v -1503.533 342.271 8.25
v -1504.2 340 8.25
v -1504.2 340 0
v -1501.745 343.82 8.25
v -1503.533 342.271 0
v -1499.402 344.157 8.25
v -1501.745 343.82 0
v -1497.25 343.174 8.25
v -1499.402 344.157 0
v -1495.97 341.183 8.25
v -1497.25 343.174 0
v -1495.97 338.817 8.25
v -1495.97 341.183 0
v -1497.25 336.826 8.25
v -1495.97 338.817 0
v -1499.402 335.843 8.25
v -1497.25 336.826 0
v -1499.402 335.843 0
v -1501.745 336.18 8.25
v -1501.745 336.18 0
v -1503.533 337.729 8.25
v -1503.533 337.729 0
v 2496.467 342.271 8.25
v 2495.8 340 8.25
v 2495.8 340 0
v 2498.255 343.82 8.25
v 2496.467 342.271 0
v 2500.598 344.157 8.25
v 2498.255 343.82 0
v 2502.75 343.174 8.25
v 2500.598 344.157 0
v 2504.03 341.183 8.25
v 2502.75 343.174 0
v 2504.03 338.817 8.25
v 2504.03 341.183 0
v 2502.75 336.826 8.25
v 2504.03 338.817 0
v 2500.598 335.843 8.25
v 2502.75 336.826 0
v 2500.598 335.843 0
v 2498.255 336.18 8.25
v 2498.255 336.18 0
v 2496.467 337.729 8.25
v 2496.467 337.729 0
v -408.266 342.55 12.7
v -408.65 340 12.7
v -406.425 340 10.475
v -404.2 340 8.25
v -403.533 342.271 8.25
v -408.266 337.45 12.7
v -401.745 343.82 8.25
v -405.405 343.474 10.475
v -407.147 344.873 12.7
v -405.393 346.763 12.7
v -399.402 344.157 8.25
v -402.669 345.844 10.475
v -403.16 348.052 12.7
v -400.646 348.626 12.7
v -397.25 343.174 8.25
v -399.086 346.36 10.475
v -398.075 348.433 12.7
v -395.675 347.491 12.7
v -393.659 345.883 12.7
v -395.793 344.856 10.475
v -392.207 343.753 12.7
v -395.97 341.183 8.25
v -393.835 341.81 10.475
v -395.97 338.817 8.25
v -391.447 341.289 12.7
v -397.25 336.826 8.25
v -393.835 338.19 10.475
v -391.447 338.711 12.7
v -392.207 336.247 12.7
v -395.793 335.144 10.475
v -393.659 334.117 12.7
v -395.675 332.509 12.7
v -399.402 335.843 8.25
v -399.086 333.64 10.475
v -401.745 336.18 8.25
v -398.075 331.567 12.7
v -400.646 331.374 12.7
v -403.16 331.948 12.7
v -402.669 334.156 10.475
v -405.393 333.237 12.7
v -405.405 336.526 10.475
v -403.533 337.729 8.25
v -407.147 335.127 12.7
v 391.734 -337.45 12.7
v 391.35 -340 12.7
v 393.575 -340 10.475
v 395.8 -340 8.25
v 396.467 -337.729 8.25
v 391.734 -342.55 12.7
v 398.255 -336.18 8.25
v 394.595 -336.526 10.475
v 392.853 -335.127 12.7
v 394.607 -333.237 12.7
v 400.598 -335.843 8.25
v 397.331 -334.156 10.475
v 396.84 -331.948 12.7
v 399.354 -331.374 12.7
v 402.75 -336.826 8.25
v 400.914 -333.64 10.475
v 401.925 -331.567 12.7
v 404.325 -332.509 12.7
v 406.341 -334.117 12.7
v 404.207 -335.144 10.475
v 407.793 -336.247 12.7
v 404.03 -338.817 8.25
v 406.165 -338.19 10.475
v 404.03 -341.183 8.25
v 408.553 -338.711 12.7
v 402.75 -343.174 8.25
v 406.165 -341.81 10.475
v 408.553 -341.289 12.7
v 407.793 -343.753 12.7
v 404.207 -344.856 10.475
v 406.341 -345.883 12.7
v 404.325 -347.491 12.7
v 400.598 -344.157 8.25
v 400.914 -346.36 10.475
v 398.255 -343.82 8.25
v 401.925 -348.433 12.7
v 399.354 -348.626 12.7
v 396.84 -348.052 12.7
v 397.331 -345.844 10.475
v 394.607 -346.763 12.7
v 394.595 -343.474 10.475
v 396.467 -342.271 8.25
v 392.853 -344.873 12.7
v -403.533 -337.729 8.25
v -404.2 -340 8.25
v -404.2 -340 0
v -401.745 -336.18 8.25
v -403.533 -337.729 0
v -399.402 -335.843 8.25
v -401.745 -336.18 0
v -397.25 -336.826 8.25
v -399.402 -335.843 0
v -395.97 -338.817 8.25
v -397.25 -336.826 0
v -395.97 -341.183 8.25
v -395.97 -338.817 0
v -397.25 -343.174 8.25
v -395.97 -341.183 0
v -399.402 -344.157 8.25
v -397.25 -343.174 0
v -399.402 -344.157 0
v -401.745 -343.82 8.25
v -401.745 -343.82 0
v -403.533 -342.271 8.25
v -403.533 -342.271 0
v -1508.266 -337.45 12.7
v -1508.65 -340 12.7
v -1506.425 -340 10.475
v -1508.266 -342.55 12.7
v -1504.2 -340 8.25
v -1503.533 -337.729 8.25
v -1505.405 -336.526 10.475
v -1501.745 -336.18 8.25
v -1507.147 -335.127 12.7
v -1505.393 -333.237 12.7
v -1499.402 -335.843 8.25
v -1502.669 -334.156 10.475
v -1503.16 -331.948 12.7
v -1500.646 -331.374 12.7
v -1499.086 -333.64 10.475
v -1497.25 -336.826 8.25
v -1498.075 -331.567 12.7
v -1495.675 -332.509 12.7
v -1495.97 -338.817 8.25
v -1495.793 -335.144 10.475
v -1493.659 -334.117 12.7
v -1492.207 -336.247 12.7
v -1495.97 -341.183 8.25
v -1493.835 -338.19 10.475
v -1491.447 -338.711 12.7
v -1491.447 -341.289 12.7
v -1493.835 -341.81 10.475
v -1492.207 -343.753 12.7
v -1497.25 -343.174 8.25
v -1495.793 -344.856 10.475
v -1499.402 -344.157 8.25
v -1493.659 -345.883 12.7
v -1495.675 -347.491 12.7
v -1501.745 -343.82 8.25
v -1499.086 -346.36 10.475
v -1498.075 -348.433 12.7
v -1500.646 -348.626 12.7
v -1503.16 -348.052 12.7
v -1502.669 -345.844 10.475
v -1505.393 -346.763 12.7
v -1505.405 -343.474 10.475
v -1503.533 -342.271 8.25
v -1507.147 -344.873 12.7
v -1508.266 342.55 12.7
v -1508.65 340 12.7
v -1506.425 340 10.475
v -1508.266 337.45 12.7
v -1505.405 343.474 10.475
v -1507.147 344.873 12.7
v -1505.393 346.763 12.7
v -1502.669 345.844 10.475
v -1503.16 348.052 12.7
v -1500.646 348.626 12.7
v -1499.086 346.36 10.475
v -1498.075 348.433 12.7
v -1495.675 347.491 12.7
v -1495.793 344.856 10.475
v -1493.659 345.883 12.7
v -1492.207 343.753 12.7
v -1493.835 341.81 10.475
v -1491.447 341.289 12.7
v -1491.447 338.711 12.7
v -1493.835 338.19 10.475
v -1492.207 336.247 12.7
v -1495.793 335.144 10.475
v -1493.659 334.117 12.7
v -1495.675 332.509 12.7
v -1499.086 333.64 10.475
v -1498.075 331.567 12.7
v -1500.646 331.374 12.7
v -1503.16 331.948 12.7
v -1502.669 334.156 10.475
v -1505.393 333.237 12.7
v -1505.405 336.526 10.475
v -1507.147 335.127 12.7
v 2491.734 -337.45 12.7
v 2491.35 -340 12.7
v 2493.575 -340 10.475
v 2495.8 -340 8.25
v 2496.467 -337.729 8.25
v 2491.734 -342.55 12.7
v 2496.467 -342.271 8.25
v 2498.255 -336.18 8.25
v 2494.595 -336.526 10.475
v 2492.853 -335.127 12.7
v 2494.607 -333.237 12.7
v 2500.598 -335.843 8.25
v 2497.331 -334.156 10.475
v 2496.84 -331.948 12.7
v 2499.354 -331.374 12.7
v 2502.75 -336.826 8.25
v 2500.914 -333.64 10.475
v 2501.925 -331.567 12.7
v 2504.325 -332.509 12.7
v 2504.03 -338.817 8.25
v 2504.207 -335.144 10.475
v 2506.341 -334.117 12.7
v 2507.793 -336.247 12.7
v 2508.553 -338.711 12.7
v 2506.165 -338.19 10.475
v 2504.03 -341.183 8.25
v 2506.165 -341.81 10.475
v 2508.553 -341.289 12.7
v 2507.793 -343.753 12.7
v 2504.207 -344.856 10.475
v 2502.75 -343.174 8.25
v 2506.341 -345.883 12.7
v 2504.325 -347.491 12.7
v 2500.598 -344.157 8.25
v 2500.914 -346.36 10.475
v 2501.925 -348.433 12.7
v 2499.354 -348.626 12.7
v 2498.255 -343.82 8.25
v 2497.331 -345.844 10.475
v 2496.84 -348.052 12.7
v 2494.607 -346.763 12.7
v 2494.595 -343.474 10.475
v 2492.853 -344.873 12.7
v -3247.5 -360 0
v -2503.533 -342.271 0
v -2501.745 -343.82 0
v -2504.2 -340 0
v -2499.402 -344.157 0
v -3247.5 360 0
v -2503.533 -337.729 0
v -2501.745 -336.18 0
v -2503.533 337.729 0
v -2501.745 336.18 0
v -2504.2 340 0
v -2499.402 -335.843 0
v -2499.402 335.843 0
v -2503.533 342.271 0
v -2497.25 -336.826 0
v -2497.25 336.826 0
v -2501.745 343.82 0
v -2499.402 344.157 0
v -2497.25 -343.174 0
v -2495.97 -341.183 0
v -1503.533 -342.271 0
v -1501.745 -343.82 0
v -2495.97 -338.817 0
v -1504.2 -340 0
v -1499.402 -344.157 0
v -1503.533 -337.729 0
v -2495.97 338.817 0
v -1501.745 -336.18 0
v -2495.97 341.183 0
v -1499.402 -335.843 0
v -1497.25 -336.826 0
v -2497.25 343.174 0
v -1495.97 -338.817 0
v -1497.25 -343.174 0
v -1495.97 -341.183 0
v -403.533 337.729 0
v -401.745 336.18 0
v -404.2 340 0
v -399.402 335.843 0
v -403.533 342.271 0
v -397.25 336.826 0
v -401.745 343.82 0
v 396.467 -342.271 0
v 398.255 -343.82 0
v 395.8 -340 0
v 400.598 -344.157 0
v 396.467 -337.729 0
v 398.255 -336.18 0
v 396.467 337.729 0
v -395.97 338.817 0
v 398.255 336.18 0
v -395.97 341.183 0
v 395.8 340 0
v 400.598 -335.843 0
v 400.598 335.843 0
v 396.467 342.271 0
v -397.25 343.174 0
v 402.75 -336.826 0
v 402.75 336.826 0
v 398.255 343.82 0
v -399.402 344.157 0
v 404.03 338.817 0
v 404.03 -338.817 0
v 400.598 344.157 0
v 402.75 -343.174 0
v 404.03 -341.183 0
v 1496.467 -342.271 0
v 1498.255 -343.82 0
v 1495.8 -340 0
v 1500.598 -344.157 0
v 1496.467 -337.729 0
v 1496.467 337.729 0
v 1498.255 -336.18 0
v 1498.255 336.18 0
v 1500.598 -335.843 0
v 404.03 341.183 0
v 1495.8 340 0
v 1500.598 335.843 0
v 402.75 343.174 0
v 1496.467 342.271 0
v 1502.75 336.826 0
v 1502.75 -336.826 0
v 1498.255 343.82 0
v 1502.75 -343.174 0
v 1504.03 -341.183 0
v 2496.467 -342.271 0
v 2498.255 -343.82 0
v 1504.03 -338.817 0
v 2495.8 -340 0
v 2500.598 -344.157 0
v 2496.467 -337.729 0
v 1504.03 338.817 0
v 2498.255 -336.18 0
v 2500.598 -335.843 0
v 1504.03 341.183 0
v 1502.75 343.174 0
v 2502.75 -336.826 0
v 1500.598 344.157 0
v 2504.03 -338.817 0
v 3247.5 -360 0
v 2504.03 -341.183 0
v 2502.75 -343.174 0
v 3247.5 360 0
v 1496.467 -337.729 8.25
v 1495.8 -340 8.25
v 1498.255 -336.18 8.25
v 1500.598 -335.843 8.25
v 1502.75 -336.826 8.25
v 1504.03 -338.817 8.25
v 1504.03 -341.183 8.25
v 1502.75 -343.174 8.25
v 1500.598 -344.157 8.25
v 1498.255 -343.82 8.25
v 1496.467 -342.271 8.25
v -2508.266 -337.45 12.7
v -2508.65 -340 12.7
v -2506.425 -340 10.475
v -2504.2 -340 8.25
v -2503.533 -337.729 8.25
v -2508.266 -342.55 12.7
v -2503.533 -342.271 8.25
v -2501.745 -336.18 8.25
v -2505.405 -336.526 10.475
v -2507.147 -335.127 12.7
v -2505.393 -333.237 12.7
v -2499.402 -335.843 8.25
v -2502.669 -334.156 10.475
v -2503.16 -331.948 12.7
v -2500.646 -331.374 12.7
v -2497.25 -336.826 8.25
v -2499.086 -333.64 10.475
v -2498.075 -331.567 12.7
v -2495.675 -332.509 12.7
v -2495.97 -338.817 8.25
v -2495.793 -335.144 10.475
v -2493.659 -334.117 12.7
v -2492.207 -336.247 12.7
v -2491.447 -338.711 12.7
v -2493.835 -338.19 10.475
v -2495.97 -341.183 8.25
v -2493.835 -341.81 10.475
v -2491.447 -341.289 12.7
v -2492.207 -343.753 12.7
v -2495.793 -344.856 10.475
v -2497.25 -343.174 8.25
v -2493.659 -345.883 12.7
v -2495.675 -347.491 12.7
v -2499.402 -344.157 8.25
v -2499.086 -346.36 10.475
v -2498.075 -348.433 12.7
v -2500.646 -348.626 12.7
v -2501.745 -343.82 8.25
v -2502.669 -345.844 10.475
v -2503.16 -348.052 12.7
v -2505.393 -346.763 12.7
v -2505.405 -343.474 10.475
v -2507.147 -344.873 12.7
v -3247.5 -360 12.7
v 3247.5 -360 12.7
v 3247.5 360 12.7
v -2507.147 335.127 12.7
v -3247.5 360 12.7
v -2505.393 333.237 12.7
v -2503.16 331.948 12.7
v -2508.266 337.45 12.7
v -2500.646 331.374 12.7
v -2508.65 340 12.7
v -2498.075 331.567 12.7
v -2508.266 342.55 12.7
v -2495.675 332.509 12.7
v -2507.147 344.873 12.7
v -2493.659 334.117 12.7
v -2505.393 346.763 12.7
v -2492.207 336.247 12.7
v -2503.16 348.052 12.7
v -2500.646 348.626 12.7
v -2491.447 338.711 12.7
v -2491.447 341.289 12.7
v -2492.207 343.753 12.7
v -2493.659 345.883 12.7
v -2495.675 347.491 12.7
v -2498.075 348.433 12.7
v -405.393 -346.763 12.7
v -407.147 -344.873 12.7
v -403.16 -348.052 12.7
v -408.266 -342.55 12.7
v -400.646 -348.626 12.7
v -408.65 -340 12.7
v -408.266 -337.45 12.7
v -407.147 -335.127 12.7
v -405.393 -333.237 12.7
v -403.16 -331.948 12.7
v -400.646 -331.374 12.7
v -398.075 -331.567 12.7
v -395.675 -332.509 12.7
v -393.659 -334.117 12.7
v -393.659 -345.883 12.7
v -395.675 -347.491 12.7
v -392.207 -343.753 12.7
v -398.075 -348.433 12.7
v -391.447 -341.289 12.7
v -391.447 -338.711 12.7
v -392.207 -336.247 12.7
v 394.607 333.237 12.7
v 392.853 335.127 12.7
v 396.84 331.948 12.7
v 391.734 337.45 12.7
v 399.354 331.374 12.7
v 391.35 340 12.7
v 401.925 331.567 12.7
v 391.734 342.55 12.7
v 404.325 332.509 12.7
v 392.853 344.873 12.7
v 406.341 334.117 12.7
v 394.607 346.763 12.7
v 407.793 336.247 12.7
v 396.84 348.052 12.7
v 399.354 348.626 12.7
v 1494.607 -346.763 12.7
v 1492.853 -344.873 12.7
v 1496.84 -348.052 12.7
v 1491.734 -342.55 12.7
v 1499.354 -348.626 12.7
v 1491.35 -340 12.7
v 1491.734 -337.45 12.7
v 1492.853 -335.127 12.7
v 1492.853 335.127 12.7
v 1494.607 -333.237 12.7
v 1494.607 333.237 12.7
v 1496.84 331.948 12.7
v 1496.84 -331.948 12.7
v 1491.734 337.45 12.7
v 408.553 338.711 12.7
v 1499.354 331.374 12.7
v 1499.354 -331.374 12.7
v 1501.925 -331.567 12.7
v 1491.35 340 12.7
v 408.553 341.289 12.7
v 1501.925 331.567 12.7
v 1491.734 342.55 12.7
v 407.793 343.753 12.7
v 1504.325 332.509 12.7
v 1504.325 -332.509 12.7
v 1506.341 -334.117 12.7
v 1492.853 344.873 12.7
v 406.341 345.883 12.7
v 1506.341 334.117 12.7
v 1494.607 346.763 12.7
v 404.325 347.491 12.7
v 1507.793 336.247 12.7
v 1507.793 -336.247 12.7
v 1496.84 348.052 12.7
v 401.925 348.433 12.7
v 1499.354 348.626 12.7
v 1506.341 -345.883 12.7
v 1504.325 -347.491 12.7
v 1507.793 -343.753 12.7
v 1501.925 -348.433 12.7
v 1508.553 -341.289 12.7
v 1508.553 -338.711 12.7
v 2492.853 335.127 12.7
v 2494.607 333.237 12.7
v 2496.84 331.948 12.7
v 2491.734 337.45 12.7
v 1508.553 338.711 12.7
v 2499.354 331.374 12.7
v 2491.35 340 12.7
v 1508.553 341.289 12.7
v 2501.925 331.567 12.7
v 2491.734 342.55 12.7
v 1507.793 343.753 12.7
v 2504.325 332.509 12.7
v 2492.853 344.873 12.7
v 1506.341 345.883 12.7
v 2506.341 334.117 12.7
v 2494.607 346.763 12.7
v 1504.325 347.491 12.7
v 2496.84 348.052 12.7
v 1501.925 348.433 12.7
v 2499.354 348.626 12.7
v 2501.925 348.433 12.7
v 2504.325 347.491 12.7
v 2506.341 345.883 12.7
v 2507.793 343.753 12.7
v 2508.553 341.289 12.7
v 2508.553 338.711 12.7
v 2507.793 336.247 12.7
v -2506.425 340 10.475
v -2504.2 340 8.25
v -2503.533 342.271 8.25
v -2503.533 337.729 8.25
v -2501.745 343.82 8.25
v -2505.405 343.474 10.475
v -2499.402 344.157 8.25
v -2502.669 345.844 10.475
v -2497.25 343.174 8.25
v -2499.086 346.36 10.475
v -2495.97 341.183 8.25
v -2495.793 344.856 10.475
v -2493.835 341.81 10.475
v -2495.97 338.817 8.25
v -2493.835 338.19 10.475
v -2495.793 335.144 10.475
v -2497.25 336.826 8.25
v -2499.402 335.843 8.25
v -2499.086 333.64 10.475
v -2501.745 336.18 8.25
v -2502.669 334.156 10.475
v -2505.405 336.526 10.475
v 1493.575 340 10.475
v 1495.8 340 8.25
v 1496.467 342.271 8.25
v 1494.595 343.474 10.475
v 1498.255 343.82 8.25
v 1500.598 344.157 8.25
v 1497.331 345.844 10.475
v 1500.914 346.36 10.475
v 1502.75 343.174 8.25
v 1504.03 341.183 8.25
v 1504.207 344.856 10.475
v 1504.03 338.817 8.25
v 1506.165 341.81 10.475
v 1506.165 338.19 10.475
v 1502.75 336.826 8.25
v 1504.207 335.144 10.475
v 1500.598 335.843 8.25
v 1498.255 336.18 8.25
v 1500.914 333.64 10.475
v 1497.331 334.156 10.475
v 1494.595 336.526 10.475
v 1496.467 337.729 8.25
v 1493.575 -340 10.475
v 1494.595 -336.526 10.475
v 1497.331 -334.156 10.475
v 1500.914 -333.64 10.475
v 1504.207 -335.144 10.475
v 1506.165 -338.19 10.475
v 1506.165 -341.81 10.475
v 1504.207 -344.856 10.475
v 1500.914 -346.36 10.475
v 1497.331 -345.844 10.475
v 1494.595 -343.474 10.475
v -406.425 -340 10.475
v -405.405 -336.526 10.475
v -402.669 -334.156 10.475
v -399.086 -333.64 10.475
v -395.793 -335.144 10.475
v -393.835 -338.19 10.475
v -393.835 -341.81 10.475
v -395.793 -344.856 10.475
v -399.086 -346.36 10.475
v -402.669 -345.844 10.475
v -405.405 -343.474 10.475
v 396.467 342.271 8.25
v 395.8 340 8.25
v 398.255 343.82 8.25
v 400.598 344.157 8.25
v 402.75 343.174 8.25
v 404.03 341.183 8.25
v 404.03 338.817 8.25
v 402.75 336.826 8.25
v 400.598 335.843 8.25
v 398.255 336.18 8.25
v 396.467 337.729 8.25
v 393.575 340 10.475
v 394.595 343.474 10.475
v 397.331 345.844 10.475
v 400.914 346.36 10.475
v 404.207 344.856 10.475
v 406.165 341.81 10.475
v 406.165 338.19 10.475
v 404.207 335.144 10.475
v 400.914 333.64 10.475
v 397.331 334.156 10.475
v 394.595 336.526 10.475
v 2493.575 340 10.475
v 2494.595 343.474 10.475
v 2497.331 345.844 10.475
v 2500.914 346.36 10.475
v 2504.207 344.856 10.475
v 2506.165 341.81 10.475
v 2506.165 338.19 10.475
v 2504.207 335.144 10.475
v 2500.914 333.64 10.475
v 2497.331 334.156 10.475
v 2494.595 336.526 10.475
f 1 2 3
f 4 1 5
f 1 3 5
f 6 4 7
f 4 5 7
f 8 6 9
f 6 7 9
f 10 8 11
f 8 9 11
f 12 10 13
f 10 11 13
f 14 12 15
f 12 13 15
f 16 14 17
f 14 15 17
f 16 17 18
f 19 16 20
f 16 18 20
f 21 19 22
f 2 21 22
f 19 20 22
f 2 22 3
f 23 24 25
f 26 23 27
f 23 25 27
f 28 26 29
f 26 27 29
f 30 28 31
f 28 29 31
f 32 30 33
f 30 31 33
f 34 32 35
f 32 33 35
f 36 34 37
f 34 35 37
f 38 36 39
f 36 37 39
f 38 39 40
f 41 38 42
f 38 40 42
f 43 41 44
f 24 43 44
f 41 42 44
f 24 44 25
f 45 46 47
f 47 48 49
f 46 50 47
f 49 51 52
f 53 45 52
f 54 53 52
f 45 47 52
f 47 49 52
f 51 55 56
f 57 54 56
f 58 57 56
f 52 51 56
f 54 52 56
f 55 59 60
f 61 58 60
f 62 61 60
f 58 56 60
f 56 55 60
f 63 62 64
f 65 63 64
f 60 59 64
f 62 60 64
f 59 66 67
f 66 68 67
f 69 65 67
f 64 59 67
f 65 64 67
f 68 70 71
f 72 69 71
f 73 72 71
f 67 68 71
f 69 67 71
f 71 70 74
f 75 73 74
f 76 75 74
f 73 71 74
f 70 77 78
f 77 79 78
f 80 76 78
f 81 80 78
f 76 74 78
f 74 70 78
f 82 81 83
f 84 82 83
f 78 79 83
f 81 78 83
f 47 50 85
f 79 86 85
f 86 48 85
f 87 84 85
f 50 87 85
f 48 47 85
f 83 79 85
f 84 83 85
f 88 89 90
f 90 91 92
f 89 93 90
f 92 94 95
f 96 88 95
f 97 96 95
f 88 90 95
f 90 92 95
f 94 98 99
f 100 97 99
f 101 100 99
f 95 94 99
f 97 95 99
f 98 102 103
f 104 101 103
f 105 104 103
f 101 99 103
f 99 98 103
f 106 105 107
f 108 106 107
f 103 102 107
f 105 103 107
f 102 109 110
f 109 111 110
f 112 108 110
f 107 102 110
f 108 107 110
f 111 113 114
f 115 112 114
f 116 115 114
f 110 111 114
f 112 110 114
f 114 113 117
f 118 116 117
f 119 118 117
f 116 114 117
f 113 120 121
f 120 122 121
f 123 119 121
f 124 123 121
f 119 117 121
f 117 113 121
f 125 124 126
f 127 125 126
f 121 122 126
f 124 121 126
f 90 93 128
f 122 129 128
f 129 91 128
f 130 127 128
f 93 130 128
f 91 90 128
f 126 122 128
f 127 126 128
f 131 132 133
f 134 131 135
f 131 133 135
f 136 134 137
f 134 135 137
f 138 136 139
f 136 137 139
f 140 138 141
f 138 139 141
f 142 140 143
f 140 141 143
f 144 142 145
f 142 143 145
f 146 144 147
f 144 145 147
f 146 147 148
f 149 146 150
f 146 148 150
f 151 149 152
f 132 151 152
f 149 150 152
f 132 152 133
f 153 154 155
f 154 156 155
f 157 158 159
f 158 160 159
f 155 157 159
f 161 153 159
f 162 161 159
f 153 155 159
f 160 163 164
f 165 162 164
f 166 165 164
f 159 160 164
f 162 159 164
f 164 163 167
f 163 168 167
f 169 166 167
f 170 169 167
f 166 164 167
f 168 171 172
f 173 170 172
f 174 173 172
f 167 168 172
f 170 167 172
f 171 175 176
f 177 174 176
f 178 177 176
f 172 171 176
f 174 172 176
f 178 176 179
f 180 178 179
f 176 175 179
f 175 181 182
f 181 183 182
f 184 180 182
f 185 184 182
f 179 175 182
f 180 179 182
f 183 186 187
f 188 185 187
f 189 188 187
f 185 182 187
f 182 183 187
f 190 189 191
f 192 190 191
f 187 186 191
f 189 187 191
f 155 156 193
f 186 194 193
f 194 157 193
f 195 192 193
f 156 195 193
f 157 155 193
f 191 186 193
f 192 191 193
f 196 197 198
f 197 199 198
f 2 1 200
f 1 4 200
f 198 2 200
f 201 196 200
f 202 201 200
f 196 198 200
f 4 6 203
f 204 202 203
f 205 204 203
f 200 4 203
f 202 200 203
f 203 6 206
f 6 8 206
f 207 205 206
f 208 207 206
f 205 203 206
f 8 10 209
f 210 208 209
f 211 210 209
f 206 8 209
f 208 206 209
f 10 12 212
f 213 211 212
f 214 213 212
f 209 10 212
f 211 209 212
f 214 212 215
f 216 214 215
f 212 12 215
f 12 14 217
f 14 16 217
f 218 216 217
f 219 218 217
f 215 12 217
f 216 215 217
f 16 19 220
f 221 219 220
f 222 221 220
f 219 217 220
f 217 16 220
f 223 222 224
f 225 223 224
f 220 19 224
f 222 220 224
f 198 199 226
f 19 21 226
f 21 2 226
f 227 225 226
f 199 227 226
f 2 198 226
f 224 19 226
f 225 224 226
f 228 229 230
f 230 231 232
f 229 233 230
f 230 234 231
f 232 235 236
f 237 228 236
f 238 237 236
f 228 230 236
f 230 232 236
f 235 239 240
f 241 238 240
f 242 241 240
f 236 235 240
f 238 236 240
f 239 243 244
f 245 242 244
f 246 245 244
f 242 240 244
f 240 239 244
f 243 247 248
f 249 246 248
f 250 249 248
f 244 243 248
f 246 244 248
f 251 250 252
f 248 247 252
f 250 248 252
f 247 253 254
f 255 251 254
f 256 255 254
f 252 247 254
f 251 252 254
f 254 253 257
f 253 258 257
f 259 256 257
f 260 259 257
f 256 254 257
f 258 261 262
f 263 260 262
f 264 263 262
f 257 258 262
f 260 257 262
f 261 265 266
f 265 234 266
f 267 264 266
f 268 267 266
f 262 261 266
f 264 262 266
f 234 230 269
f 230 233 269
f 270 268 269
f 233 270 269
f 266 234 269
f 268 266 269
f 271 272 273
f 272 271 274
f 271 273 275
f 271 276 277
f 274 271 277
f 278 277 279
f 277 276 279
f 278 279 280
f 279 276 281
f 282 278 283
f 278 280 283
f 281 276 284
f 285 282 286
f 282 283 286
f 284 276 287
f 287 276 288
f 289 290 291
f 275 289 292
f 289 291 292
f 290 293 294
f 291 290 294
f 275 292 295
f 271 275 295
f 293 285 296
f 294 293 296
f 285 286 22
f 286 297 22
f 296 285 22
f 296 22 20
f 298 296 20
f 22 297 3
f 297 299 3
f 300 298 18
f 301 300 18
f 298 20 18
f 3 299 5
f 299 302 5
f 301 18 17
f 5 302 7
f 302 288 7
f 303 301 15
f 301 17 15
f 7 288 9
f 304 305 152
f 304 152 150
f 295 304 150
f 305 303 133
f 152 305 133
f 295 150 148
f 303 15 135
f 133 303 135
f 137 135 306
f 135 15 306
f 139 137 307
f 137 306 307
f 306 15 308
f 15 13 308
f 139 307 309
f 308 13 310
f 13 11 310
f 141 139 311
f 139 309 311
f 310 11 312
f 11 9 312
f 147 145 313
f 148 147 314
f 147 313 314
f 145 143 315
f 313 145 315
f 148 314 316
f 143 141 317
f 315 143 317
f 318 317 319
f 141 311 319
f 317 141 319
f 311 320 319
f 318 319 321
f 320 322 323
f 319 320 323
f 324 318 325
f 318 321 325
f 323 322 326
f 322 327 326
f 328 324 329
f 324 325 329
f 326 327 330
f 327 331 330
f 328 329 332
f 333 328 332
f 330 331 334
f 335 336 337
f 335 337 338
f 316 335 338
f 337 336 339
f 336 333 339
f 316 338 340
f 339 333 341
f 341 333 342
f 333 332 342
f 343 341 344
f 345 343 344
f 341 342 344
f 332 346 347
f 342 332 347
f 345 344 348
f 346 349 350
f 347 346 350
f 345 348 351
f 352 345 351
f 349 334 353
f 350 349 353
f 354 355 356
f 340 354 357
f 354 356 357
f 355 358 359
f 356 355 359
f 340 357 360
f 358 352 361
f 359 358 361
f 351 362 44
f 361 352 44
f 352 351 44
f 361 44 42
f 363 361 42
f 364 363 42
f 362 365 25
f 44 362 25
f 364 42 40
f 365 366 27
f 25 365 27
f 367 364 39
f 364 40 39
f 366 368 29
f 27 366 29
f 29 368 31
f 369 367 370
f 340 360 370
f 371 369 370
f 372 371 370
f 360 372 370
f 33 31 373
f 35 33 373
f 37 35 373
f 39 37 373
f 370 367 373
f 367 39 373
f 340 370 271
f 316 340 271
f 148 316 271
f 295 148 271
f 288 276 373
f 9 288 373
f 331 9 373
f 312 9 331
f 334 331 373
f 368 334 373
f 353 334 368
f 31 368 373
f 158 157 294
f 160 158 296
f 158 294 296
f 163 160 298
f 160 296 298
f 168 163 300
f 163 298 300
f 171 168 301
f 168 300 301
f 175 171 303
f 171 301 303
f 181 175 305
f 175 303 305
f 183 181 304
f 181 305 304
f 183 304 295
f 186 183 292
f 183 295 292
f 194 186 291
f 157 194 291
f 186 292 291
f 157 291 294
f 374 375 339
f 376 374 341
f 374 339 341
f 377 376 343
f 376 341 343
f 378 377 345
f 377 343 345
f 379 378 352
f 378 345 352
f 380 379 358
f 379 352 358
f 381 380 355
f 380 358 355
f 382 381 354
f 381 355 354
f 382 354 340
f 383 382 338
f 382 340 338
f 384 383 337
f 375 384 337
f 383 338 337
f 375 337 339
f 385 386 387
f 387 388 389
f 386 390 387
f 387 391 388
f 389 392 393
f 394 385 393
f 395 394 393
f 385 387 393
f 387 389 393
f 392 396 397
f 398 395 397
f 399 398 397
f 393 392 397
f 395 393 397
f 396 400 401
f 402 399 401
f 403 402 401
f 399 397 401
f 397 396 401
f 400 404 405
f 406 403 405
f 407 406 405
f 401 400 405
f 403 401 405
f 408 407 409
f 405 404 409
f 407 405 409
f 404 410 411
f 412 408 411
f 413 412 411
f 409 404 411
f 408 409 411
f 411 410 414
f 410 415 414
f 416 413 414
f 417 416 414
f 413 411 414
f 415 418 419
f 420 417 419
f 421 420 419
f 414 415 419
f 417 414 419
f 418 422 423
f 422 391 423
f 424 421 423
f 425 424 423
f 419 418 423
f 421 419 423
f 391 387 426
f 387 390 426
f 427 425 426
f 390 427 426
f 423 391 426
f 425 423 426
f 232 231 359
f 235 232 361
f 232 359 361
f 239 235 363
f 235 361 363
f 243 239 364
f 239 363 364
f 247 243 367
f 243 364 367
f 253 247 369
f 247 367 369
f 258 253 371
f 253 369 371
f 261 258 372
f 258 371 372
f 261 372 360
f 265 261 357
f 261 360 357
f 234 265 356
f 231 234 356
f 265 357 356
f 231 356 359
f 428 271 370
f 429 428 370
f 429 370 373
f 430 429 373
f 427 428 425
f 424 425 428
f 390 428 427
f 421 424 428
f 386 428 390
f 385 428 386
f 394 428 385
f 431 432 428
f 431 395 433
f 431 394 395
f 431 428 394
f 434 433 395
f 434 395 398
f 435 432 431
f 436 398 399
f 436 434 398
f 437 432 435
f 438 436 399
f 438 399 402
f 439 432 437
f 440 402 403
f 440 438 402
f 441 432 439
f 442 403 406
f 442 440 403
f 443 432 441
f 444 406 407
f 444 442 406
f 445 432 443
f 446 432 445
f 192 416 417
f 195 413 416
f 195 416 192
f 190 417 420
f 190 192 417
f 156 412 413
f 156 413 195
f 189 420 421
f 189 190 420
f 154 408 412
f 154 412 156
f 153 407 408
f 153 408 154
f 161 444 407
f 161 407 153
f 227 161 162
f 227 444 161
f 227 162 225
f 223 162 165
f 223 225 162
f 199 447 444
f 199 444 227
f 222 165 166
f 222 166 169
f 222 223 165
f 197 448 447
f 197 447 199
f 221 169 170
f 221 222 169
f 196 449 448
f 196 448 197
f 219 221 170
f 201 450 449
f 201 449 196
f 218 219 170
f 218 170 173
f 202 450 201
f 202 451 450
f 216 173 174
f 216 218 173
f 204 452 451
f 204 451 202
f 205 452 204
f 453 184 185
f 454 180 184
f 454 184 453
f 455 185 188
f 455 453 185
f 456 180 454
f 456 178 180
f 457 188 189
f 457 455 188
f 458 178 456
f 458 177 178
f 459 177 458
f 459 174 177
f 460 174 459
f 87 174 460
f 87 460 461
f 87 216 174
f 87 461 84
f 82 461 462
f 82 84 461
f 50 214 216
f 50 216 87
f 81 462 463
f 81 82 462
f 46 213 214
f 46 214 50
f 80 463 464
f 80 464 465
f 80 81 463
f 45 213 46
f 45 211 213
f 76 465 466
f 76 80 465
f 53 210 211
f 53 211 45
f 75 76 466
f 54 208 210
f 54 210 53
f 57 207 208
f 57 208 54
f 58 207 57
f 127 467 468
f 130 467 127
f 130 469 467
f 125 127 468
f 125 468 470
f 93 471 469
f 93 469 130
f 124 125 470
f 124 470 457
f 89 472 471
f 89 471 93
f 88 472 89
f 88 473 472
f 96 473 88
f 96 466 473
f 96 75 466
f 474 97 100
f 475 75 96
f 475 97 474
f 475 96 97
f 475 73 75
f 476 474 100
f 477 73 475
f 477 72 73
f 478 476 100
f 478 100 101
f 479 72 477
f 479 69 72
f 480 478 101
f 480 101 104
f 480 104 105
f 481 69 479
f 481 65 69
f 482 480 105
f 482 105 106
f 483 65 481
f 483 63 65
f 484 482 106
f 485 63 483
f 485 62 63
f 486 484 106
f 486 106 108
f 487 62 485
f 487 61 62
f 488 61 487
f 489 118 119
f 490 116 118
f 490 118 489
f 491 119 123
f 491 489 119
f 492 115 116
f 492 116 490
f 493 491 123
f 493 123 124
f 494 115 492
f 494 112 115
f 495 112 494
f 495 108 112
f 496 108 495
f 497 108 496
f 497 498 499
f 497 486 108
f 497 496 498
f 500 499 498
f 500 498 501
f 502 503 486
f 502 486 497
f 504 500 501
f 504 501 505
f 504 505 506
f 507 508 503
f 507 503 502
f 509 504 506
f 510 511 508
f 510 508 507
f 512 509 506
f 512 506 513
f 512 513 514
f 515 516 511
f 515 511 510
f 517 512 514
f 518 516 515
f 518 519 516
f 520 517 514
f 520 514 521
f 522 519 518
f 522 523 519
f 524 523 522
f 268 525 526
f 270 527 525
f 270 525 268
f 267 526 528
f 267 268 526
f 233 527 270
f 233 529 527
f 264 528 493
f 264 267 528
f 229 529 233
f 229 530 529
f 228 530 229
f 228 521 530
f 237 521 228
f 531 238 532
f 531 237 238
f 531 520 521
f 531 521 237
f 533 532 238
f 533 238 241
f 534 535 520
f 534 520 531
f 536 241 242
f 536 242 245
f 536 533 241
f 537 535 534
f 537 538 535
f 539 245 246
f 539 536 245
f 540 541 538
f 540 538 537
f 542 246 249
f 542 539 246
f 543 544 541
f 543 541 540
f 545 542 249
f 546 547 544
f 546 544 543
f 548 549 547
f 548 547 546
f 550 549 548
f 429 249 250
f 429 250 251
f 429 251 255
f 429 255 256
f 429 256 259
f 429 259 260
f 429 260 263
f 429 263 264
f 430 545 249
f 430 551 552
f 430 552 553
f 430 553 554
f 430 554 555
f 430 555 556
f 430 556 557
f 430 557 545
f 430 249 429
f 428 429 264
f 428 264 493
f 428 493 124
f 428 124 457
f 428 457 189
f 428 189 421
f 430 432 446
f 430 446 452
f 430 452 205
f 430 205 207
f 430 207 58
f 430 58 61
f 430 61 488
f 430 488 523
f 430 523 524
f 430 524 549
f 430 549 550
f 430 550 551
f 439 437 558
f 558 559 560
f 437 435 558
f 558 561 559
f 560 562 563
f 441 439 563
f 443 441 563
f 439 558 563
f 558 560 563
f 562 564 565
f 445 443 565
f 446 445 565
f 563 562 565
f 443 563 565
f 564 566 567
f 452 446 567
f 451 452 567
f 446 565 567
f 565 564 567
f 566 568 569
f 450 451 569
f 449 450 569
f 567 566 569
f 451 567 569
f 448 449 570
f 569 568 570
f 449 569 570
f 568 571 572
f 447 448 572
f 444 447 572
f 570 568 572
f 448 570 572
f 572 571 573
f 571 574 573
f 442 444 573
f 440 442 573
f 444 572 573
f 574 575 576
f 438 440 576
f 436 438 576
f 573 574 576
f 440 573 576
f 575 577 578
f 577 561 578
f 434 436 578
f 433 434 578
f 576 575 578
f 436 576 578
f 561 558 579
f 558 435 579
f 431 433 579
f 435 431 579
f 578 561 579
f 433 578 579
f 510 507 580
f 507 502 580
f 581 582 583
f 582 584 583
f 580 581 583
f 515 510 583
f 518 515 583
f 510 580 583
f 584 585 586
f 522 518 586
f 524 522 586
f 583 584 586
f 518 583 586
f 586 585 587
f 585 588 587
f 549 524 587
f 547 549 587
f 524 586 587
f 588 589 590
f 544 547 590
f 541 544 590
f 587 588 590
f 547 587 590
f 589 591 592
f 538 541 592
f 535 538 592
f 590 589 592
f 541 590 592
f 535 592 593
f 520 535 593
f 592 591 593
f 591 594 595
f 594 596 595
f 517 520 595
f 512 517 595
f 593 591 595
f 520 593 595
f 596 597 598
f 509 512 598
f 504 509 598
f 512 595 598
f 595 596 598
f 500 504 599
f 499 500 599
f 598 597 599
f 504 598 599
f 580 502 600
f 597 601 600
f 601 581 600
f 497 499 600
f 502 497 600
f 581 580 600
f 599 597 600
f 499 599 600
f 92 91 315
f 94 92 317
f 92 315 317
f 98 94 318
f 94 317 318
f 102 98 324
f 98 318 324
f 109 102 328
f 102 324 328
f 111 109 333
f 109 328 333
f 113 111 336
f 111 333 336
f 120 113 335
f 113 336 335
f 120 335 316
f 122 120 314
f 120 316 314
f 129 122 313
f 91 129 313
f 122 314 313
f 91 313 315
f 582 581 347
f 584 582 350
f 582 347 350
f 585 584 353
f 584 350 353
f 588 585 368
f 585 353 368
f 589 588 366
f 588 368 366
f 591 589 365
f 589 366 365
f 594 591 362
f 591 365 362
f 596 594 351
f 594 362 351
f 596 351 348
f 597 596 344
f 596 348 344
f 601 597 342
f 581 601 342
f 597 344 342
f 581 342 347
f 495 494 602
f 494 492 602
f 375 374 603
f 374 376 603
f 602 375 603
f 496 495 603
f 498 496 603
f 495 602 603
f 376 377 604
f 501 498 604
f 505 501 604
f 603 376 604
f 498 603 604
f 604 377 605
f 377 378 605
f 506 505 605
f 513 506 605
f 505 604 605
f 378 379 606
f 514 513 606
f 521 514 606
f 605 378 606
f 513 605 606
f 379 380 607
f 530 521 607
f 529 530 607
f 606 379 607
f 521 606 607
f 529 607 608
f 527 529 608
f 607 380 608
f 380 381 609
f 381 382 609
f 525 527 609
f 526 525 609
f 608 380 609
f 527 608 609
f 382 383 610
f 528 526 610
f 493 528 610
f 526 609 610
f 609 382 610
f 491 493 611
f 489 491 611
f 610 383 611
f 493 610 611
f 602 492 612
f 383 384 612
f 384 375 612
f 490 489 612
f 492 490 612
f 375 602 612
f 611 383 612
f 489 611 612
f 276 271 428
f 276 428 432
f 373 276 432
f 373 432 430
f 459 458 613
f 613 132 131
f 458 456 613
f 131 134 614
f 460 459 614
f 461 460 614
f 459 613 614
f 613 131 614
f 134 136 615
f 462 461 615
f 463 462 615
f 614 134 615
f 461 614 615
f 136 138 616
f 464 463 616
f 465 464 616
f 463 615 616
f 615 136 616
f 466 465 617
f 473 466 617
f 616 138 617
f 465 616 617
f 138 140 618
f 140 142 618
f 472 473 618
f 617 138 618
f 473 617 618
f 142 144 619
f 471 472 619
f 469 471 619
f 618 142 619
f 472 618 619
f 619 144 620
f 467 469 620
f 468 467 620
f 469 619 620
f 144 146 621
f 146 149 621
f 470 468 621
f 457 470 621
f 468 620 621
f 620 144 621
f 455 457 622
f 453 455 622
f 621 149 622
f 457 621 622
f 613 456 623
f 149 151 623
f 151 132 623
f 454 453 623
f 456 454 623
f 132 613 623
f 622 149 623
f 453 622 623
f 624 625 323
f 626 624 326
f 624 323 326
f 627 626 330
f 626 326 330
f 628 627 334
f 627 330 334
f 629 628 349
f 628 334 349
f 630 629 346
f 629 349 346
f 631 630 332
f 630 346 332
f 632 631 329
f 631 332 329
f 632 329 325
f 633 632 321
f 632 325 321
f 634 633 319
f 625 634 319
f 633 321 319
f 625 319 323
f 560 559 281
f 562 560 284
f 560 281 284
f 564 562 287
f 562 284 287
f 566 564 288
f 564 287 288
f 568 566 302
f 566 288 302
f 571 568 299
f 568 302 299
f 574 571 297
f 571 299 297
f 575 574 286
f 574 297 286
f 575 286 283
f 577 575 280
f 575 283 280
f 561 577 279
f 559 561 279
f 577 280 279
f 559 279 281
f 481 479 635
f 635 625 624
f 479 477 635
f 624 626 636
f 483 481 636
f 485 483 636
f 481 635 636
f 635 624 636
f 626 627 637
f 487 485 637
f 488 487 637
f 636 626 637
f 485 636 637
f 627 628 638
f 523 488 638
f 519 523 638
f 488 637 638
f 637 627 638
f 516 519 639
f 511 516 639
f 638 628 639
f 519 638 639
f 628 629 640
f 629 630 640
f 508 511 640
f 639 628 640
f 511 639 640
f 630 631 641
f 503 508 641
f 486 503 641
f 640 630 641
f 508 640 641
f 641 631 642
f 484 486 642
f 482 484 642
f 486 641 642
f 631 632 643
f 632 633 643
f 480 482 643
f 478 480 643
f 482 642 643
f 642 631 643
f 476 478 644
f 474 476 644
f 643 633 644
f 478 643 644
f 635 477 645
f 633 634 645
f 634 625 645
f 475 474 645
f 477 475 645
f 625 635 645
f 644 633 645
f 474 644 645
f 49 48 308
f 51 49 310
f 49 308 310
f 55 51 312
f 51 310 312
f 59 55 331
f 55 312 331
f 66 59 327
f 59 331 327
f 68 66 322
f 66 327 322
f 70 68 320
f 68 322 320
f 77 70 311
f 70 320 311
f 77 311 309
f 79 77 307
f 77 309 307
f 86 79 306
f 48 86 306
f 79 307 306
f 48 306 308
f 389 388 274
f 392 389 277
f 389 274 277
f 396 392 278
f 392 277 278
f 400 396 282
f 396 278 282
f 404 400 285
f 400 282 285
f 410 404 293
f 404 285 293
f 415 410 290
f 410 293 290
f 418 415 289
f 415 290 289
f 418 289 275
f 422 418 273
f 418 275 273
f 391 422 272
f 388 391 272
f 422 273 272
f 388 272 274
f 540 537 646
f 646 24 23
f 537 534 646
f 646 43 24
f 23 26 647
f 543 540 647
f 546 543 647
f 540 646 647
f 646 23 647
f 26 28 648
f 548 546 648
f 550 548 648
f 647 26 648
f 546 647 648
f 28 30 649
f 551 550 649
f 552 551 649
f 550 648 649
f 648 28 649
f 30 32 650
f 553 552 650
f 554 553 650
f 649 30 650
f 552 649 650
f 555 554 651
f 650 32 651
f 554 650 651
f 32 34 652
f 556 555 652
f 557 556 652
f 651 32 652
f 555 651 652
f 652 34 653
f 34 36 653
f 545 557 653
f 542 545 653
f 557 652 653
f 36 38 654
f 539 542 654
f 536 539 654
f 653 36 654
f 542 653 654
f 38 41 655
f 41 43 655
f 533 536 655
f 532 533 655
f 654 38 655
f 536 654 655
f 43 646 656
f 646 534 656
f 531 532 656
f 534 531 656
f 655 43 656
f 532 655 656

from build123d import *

# Parameters (mm, degrees)
SKETCH1_W                                       = 6495
SKETCH1_H                                       = 720
BOSS_EXTRUDE1_DEPTH                             = 12.7
CSK_FOR_M8_FLAT_HEAD_MACHINE_SCREW1_D           = 8.4
CSK_FOR_M8_FLAT_HEAD_MACHINE_SCREW1_DEPTH       = 30
CSK_FOR_M8_FLAT_HEAD_MACHINE_SCREW1_CSINK_D     = 17.3
CSK_FOR_M8_FLAT_HEAD_MACHINE_SCREW1_CSINK_ANGLE = 90
CSK_FOR_M8_FLAT_HEAD_MACHINE_SCREW1_TIP         = 2.5236146


with BuildPart() as part:
    # Sketch1 → Boss-Extrude1 (new body)
    with BuildSketch(Plane.XY):
        Rectangle(SKETCH1_W, SKETCH1_H)
    extrude(amount=BOSS_EXTRUDE1_DEPTH)

    # CSK for M8 Flat Head Machine Screw1
    with Locations(Plane.XY.offset(12.7)):
        with Locations((-2500, 340), (-1500, 340), (400, 340), (1500, 340), (2500, 340), (2500, -340), (1500, -340), (400, -340), (-1500, -340), (-2500, -340), (-400, 340), (-400, -340)):
            CounterSinkHole(CSK_FOR_M8_FLAT_HEAD_MACHINE_SCREW1_D / 2, CSK_FOR_M8_FLAT_HEAD_MACHINE_SCREW1_CSINK_D / 2, depth=CSK_FOR_M8_FLAT_HEAD_MACHINE_SCREW1_DEPTH, counter_sink_angle=CSK_FOR_M8_FLAT_HEAD_MACHINE_SCREW1_CSINK_ANGLE)
            with Locations((0, 0, -(CSK_FOR_M8_FLAT_HEAD_MACHINE_SCREW1_DEPTH + CSK_FOR_M8_FLAT_HEAD_MACHINE_SCREW1_TIP / 2))):  # 118° drill point
                Cone(0, CSK_FOR_M8_FLAT_HEAD_MACHINE_SCREW1_D / 2, CSK_FOR_M8_FLAT_HEAD_MACHINE_SCREW1_TIP, mode=Mode.SUBTRACT)


solid = part.part
